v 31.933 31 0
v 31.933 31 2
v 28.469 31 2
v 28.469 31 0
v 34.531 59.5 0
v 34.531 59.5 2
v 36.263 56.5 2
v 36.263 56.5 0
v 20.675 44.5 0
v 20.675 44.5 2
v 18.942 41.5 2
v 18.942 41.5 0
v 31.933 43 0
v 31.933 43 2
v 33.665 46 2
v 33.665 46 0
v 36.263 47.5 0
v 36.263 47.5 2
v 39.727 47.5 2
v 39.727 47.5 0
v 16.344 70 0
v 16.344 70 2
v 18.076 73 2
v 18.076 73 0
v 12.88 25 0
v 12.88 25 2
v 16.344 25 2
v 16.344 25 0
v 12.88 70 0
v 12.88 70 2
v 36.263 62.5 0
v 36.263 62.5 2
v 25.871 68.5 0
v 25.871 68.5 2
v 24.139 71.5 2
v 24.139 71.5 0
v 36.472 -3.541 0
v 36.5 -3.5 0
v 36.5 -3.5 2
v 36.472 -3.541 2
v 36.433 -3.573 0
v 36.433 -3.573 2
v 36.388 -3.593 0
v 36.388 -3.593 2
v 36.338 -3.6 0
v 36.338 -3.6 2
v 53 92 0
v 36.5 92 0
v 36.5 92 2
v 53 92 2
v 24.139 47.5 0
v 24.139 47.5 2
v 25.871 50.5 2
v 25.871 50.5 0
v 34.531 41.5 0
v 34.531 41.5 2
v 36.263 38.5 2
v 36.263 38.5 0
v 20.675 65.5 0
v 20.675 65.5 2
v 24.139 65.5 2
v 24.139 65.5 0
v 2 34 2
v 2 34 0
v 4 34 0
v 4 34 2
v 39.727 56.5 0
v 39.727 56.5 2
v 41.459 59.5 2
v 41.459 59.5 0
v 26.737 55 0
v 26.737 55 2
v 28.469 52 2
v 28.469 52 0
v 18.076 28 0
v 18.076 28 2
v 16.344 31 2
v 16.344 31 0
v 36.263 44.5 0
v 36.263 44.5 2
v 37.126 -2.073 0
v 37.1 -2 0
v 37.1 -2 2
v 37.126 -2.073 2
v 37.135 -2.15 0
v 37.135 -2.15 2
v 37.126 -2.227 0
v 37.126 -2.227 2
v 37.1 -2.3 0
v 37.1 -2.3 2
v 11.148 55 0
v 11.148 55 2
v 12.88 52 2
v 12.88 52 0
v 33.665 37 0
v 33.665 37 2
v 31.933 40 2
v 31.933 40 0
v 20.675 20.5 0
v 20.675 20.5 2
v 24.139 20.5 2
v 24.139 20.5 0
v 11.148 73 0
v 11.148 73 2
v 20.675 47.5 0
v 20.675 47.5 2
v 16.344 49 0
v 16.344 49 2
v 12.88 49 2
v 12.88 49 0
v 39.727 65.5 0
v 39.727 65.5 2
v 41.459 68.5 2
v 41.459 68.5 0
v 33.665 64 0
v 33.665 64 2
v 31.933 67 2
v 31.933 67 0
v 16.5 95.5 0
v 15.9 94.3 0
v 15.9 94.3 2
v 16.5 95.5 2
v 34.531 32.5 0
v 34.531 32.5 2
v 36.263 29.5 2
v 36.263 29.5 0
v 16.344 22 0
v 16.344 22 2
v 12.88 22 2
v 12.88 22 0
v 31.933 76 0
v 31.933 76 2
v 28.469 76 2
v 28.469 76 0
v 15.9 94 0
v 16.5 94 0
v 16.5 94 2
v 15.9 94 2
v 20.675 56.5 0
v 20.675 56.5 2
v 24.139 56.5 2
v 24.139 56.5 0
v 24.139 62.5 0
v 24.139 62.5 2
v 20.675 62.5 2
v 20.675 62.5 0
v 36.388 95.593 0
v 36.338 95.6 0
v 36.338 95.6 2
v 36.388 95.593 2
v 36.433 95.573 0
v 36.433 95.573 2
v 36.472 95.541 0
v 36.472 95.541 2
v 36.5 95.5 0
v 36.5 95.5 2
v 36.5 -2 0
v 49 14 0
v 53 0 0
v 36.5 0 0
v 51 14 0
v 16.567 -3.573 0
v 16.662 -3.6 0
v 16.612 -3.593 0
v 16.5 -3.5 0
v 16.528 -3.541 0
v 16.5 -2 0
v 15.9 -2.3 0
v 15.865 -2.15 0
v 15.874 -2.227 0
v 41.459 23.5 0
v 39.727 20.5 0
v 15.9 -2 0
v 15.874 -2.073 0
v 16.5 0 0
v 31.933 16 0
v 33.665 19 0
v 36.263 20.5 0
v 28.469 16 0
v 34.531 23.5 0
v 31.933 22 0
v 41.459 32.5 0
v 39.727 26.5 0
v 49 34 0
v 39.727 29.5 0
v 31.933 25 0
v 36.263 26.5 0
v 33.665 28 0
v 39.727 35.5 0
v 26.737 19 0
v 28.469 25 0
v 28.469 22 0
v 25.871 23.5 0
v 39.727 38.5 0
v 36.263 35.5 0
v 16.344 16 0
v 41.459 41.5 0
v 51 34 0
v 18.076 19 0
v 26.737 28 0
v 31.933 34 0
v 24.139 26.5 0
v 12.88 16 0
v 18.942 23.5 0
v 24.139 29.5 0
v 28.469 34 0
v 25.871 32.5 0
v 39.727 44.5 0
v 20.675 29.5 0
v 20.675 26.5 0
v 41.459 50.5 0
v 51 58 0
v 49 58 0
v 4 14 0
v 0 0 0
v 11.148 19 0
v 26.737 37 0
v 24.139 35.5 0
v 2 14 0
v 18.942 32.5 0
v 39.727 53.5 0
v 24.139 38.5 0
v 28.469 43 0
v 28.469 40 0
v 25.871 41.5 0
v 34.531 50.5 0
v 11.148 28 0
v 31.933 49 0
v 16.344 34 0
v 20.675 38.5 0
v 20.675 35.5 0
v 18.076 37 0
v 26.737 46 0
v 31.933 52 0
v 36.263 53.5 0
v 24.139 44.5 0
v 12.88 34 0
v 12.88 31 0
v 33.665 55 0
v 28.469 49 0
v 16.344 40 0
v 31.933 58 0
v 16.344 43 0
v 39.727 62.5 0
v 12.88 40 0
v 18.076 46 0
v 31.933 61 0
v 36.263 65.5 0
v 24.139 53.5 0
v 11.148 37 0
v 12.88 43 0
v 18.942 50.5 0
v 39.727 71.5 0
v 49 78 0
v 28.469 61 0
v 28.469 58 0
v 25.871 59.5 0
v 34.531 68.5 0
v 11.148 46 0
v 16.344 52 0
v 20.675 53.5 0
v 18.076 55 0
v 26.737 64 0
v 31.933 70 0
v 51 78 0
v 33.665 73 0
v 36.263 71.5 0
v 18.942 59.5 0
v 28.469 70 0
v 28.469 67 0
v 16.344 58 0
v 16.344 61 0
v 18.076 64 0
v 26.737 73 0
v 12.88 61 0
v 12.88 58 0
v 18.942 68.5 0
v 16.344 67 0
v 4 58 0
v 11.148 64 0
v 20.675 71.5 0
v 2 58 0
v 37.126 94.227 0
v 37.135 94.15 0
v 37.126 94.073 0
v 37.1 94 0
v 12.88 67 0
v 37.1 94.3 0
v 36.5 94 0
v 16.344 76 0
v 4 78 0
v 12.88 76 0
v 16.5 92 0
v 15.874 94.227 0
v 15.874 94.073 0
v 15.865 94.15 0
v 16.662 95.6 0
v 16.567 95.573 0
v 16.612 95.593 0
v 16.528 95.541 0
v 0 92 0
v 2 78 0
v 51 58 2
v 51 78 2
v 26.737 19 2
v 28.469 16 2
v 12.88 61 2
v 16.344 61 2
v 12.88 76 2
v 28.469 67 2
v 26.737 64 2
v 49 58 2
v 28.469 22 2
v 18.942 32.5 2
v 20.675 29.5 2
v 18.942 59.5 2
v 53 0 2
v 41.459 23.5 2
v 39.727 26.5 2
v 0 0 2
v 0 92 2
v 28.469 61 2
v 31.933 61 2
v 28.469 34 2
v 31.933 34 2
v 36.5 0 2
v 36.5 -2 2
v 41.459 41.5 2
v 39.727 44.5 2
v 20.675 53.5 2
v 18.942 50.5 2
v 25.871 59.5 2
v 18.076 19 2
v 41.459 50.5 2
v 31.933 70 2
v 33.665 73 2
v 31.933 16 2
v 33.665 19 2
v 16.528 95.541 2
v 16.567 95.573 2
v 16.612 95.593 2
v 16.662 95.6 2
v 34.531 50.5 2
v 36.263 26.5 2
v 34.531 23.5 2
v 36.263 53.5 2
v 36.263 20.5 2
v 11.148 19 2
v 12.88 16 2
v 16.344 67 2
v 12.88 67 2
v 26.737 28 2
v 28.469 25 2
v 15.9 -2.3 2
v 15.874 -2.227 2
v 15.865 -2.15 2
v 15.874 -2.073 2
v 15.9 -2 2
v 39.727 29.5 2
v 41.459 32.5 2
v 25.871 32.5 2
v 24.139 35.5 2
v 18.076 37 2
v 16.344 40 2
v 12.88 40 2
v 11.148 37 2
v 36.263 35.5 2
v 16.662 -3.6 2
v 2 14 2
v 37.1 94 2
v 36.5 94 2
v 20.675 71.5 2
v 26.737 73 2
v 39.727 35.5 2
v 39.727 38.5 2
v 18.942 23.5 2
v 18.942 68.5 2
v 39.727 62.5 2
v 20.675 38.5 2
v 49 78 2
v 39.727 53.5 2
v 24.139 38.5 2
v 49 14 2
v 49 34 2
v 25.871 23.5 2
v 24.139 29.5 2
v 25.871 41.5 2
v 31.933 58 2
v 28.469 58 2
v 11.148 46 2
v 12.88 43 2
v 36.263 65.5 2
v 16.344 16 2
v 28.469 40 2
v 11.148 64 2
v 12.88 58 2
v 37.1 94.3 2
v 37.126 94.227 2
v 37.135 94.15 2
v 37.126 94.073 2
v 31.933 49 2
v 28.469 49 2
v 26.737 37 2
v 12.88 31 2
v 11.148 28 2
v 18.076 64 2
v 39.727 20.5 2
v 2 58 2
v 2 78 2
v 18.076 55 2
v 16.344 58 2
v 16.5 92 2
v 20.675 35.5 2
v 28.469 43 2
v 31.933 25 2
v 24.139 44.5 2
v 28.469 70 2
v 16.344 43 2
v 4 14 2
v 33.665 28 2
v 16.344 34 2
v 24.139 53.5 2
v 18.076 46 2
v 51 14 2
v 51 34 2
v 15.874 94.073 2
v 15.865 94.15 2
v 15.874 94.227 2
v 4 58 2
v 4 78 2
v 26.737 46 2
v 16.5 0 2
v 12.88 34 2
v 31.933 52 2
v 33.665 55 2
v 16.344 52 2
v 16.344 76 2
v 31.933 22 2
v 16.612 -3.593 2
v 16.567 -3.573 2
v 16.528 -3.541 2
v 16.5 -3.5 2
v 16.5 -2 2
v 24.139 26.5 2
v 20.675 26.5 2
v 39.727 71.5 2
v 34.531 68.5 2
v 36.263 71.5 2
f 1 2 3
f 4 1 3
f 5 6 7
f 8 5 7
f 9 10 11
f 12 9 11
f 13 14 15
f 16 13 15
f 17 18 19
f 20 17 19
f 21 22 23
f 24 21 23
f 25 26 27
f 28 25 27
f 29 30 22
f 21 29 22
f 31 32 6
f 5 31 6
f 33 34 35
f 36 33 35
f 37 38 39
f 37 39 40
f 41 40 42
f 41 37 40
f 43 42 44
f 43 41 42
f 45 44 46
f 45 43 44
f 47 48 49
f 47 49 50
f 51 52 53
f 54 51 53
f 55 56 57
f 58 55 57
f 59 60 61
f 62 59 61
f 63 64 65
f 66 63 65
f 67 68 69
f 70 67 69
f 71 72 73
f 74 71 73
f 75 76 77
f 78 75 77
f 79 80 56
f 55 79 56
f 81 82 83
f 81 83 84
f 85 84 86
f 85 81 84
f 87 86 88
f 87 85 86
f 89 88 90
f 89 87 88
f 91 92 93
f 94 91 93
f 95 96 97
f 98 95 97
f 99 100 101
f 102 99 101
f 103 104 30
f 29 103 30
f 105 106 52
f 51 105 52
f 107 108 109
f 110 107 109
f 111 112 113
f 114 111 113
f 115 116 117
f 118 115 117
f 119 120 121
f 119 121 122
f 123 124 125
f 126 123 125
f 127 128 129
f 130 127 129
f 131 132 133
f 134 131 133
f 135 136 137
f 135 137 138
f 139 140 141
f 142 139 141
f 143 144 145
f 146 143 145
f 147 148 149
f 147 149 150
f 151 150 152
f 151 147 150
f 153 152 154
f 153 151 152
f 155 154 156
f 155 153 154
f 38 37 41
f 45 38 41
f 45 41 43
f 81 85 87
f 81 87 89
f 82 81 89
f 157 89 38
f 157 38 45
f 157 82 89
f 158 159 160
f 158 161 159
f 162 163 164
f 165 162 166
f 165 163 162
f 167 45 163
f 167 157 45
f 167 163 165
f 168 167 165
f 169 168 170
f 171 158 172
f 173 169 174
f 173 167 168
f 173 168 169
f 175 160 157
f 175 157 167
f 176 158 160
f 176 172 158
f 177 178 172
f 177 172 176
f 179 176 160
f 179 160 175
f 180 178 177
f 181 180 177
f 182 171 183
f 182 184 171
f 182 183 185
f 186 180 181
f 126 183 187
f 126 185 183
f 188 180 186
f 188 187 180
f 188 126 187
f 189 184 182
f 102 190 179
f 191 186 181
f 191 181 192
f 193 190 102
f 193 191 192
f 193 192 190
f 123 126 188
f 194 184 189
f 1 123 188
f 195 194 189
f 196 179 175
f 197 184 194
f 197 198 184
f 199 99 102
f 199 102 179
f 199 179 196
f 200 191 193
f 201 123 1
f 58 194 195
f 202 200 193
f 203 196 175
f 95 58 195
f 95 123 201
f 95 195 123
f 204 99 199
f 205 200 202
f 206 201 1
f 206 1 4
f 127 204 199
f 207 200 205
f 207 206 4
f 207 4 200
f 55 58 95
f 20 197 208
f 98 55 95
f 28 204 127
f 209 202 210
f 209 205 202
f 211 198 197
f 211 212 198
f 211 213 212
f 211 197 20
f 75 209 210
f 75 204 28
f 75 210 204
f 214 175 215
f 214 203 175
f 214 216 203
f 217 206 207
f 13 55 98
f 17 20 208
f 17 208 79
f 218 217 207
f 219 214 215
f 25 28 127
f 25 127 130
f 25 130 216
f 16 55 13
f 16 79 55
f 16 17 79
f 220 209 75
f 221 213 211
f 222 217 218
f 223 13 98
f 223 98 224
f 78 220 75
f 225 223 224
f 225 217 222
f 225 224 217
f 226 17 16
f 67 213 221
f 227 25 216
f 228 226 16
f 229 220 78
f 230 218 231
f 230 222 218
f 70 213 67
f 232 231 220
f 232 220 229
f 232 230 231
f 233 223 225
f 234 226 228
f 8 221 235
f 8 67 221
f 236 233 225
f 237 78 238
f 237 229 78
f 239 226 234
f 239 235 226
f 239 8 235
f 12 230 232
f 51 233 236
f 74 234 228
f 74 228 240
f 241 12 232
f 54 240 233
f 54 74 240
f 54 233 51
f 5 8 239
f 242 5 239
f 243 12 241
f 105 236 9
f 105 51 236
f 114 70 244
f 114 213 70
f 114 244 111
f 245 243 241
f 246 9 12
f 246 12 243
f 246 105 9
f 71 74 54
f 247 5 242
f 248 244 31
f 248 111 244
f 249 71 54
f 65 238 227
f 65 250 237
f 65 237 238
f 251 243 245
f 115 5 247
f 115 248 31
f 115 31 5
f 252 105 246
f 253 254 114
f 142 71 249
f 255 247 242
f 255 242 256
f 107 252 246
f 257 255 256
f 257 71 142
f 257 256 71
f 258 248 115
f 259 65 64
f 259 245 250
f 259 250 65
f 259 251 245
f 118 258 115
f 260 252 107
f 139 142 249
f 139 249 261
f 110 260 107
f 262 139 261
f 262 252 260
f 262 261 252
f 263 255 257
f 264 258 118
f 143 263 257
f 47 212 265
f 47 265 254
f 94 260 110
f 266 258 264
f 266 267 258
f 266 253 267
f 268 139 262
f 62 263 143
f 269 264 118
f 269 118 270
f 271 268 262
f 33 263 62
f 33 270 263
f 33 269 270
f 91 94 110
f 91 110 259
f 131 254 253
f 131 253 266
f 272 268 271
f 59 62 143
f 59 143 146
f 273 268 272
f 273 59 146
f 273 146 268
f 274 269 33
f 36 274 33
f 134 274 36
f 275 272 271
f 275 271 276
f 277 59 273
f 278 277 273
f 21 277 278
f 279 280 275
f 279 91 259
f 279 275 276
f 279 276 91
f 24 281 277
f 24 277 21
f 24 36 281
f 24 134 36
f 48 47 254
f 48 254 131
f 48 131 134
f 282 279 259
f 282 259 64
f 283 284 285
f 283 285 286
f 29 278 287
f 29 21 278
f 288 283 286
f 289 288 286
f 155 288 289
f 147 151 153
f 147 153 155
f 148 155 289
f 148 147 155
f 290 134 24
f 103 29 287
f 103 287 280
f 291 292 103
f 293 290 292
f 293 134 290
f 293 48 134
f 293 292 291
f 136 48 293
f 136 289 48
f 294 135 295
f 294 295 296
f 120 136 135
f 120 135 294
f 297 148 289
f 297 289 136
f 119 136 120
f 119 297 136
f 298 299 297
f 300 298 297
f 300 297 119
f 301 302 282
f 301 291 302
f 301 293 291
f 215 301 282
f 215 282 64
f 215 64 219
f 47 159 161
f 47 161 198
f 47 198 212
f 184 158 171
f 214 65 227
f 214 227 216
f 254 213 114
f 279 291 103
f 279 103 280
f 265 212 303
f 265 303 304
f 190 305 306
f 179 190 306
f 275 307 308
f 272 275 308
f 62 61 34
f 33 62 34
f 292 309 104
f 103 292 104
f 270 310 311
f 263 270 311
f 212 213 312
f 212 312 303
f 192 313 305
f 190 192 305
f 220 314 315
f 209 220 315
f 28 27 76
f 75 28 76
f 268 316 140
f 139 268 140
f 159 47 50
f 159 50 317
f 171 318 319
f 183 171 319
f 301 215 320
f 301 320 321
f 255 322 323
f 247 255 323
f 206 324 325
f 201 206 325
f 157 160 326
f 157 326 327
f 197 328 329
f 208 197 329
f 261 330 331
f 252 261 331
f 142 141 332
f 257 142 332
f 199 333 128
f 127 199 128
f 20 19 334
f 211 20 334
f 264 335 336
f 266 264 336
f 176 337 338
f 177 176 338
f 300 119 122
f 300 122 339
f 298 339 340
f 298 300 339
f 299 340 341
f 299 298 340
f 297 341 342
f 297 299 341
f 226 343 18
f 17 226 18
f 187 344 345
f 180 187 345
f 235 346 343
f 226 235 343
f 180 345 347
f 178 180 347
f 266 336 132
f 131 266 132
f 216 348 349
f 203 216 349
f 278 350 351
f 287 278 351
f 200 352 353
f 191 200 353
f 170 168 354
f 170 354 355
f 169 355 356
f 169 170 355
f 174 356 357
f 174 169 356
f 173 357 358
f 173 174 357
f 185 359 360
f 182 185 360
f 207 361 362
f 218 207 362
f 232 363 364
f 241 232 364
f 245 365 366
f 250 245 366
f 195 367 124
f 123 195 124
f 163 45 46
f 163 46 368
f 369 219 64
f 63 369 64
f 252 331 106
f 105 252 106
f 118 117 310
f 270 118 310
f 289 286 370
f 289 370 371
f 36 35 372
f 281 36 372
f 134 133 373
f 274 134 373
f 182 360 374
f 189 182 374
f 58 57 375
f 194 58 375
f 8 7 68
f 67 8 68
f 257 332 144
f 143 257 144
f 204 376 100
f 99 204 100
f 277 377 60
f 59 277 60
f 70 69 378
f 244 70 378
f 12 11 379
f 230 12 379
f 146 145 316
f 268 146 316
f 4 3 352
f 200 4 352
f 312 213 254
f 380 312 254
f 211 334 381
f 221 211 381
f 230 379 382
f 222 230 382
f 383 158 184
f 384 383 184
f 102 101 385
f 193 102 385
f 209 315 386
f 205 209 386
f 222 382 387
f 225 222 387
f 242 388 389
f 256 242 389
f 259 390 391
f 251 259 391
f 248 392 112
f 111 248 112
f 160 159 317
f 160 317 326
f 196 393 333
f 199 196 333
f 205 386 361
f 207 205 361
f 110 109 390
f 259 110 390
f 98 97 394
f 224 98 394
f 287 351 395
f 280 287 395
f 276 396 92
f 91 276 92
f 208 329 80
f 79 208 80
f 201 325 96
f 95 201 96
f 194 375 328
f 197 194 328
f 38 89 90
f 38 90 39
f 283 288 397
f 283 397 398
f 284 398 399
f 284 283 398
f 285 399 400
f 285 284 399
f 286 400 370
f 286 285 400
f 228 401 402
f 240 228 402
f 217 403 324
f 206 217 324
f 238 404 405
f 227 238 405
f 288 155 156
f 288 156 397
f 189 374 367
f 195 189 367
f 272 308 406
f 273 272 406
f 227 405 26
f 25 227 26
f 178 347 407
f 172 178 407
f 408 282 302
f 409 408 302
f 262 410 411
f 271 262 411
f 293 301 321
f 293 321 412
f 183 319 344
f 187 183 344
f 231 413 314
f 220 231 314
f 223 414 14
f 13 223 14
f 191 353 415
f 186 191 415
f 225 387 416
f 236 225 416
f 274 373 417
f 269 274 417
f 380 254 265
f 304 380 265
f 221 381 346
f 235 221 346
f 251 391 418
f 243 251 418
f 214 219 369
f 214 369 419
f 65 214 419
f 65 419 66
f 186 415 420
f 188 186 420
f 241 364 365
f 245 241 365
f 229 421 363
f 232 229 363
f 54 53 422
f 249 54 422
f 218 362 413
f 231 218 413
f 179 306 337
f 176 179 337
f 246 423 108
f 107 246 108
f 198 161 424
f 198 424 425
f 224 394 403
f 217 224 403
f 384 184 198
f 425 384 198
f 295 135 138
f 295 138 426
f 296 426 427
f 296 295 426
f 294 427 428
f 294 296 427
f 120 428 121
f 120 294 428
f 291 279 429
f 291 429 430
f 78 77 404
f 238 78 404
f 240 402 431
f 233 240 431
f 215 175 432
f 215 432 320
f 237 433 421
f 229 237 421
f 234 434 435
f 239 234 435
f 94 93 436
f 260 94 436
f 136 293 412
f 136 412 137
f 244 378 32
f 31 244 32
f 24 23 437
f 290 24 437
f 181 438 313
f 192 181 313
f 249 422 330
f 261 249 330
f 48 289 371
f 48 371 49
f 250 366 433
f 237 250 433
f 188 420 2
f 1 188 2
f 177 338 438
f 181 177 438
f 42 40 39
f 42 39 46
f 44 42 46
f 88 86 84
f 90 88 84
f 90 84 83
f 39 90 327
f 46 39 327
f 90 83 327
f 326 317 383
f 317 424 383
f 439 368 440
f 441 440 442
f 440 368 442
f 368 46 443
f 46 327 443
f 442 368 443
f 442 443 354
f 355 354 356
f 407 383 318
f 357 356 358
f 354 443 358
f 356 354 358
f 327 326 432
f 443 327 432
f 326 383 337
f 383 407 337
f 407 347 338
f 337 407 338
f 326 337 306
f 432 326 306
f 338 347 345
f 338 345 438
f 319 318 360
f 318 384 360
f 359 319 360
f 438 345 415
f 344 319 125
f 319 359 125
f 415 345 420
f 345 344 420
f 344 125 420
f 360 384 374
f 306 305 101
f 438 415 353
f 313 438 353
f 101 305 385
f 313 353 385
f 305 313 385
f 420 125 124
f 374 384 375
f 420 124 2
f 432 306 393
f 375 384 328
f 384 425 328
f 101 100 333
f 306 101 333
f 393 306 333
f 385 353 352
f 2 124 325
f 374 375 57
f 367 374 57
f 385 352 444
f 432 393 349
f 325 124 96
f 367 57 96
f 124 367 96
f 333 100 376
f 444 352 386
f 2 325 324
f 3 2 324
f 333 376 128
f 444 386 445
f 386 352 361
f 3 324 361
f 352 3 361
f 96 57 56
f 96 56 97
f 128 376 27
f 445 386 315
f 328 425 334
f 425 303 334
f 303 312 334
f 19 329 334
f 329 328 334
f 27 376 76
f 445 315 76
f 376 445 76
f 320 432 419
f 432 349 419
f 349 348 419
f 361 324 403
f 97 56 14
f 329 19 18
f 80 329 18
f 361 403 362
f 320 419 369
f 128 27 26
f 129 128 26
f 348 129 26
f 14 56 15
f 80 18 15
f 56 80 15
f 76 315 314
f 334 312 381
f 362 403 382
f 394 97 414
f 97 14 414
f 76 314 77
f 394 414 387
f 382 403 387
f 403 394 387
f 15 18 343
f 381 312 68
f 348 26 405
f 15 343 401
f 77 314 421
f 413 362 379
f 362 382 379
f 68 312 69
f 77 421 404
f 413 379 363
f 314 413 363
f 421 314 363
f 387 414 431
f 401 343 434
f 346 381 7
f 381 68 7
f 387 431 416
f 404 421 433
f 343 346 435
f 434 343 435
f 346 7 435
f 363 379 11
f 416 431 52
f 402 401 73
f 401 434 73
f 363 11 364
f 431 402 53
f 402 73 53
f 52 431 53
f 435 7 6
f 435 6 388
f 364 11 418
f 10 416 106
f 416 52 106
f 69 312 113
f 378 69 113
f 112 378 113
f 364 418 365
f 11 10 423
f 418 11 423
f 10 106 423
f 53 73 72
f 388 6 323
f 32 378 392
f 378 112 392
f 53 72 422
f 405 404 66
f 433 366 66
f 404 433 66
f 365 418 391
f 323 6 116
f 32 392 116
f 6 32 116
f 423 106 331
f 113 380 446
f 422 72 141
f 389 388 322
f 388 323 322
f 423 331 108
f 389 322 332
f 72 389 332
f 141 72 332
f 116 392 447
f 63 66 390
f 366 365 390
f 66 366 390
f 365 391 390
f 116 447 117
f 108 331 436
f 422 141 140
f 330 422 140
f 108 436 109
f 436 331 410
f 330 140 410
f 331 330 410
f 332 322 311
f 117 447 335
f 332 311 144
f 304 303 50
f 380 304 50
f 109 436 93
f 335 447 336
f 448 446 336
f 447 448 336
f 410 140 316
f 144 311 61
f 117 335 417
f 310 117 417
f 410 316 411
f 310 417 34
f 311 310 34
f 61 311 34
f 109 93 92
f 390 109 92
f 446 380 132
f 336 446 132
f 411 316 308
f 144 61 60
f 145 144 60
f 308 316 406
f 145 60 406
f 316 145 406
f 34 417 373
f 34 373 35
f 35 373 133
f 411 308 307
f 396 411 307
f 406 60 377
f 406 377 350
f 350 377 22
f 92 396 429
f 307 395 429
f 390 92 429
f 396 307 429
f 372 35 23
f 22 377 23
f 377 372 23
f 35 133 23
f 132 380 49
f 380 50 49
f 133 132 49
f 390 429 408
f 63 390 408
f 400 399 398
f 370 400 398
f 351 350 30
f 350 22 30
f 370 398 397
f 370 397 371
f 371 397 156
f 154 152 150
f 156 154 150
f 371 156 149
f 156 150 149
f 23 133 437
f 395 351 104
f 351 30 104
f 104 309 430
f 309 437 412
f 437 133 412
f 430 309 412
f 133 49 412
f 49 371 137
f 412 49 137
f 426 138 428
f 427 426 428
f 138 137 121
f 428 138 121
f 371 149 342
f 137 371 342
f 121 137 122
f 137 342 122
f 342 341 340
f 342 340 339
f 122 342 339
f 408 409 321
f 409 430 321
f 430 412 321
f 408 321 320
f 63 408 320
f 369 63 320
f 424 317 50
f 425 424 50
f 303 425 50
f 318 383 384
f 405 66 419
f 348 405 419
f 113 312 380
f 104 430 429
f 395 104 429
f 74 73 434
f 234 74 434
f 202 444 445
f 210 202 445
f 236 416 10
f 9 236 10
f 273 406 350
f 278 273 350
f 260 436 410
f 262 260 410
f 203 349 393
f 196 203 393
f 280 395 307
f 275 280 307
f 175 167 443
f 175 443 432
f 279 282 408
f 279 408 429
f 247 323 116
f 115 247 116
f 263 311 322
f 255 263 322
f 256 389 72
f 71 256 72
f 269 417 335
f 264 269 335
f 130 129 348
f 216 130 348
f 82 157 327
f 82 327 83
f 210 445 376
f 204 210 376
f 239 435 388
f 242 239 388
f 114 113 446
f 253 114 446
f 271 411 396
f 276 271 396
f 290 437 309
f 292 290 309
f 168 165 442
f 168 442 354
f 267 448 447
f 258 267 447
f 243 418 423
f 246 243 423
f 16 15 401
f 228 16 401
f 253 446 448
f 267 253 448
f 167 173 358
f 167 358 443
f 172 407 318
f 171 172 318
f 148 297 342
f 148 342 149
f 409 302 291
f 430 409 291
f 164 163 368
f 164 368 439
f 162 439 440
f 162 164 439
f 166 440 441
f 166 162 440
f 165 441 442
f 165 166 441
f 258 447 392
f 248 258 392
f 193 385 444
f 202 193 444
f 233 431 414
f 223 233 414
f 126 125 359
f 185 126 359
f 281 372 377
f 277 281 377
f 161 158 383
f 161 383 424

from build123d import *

# Parameters (mm, degrees)
SKETCH1_W           = 2
SKETCH1_H           = 20
BOSS_EXTRUDE1_DEPTH = 2
CUT_EXTRUDE1_DEPTH  = 110.326849401


with BuildPart() as part:
    # Sketch1 → Boss-Extrude1 (new body)
    with BuildSketch(Plane.XY):
        with BuildLine():
            Line((16.5, 0), (0, 0))
            Line((0, 0), (0, 92))
            Line((0, 92), (16.5, 92))
            Line((16.5, 92), (16.5, 94))
            Line((16.5, 94), (15.9, 94))
            ThreePointArc((15.9, 94), (15.864589803, 94.15), (15.9, 94.3))
            Line((15.9, 94.3), (16.5, 95.5))
            ThreePointArc((16.5, 95.5), (16.566697747, 95.572982477), (16.661803399, 95.6))
            Line((16.661803399, 95.6), (36.338196601, 95.6))
            ThreePointArc((36.338196601, 95.6), (36.433302253, 95.572982477), (36.5, 95.5))
            Line((36.5, 95.5), (37.1, 94.3))
            ThreePointArc((37.1, 94.3), (37.135410197, 94.15), (37.1, 94))
            Line((37.1, 94), (36.5, 94))
            Line((36.5, 94), (36.5, 92))
            Line((36.5, 92), (53, 92))
            Line((53, 92), (53, 0))
            Line((53, 0), (36.5, 0))
            Line((36.5, 0), (36.5, -2))
            Line((36.5, -2), (37.1, -2))
            ThreePointArc((37.1, -2), (37.135410197, -2.15), (37.1, -2.3))
            Line((37.1, -2.3), (36.5, -3.5))
            ThreePointArc((36.5, -3.5), (36.433302253, -3.572982477), (36.338196601, -3.6))
            Line((36.338196601, -3.6), (16.661803399, -3.6))
            ThreePointArc((16.661803399, -3.6), (16.566697747, -3.572982477), (16.5, -3.5))
            Line((16.5, -3.5), (15.9, -2.3))
            ThreePointArc((15.9, -2.3), (15.864589803, -2.15), (15.9, -2))
            Line((15.9, -2), (16.5, -2))
            Line((16.5, -2), (16.5, 0))
        make_face()
        with Locations((3, 68)):
            Rectangle(SKETCH1_W, SKETCH1_H, mode=Mode.SUBTRACT)
        with Locations((50, 68)):
            Rectangle(SKETCH1_W, SKETCH1_H, mode=Mode.SUBTRACT)
        with Locations((50, 24)):
            Rectangle(SKETCH1_W, SKETCH1_H, mode=Mode.SUBTRACT)
        with Locations((3, 24)):
            Rectangle(SKETCH1_W, SKETCH1_H, mode=Mode.SUBTRACT)
    extrude(amount=BOSS_EXTRUDE1_DEPTH)

    # Sketch2 → Cut-Extrude1 (cut, through all)
    with BuildSketch(Plane.XY.offset(2)):
        Polygon((16.344420914, 16), (18.076471722, 19), (16.344420914, 22), (12.880319299, 22), (11.148268492, 19), (12.880319299, 16), align=None)
        Polygon((20.674547933, 26.5), (18.942497126, 23.5), (20.674547933, 20.5), (24.138649548, 20.5), (25.870700356, 23.5), (24.138649548, 26.5), align=None)
        Polygon((12.880319299, 25), (16.344420914, 25), (18.076471722, 28), (16.344420914, 31), (12.880319299, 31), (11.148268492, 28), align=None)
        Polygon((20.674547933, 35.5), (18.942497126, 32.5), (20.674547933, 29.5), (24.138649548, 29.5), (25.870700356, 32.5), (24.138649548, 35.5), align=None)
        Polygon((12.880319299, 40), (11.148268492, 37), (12.880319299, 34), (16.344420914, 34), (18.076471722, 37), (16.344420914, 40), align=None)
        Polygon((20.674547933, 44.5), (18.942497126, 41.5), (20.674547933, 38.5), (24.138649548, 38.5), (25.870700356, 41.5), (24.138649548, 44.5), align=None)
        Polygon((12.880319299, 49), (11.148268492, 46), (12.880319299, 43), (16.344420914, 43), (18.076471722, 46), (16.344420914, 49), align=None)
        Polygon((12.880319299, 52), (16.344420914, 52), (18.076471722, 55), (16.344420914, 58), (12.880319299, 58), (11.148268492, 55), align=None)
        Polygon((20.674547933, 62.5), (18.942497126, 59.5), (20.674547933, 56.5), (24.138649548, 56.5), (25.870700356, 59.5), (24.138649548, 62.5), align=None)
        Polygon((12.880319299, 67), (11.148268492, 64), (12.880319299, 61), (16.344420914, 61), (18.076471722, 64), (16.344420914, 67), align=None)
        Polygon((20.674547933, 71.5), (18.942497126, 68.5), (20.674547933, 65.5), (24.138649548, 65.5), (25.870700356, 68.5), (24.138649548, 71.5), align=None)
        Polygon((12.880319299, 76), (11.148268492, 73), (12.880319299, 70), (16.344420914, 70), (18.076471722, 73), (16.344420914, 76), align=None)
        Polygon((24.138649548, 47.5), (25.870700356, 50.5), (24.138649548, 53.5), (20.674547933, 53.5), (18.942497126, 50.5), (20.674547933, 47.5), align=None)
        Polygon((31.932878182, 16), (33.66492899, 19), (31.932878182, 22), (28.468776567, 22), (26.73672576, 19), (28.468776567, 16), align=None)
        Polygon((36.263005201, 26.5), (34.530954394, 23.5), (36.263005201, 20.5), (39.727106816, 20.5), (41.459157624, 23.5), (39.727106816, 26.5), align=None)
        Polygon((28.468776567, 25), (31.932878182, 25), (33.66492899, 28), (31.932878182, 31), (28.468776567, 31), (26.73672576, 28), align=None)
        Polygon((36.263005201, 35.5), (34.530954394, 32.5), (36.263005201, 29.5), (39.727106816, 29.5), (41.459157624, 32.5), (39.727106816, 35.5), align=None)
        Polygon((28.468776567, 40), (26.73672576, 37), (28.468776567, 34), (31.932878182, 34), (33.66492899, 37), (31.932878182, 40), align=None)
        Polygon((36.263005201, 44.5), (34.530954394, 41.5), (36.263005201, 38.5), (39.727106816, 38.5), (41.459157624, 41.5), (39.727106816, 44.5), align=None)
        Polygon((28.468776567, 49), (26.73672576, 46), (28.468776567, 43), (31.932878182, 43), (33.66492899, 46), (31.932878182, 49), align=None)
        Polygon((28.468776567, 52), (31.932878182, 52), (33.66492899, 55), (31.932878182, 58), (28.468776567, 58), (26.73672576, 55), align=None)
        Polygon((36.263005201, 62.5), (34.530954394, 59.5), (36.263005201, 56.5), (39.727106816, 56.5), (41.459157624, 59.5), (39.727106816, 62.5), align=None)
        Polygon((28.468776567, 67), (26.73672576, 64), (28.468776567, 61), (31.932878182, 61), (33.66492899, 64), (31.932878182, 67), align=None)
        Polygon((36.263005201, 71.5), (34.530954394, 68.5), (36.263005201, 65.5), (39.727106816, 65.5), (41.459157624, 68.5), (39.727106816, 71.5), align=None)
        Polygon((28.468776567, 76), (26.73672576, 73), (28.468776567, 70), (31.932878182, 70), (33.66492899, 73), (31.932878182, 76), align=None)
        Polygon((39.727106816, 47.5), (41.459157624, 50.5), (39.727106816, 53.5), (36.263005201, 53.5), (34.530954394, 50.5), (36.263005201, 47.5), align=None)
    extrude(amount=-CUT_EXTRUDE1_DEPTH, mode=Mode.SUBTRACT)


solid = part.part
